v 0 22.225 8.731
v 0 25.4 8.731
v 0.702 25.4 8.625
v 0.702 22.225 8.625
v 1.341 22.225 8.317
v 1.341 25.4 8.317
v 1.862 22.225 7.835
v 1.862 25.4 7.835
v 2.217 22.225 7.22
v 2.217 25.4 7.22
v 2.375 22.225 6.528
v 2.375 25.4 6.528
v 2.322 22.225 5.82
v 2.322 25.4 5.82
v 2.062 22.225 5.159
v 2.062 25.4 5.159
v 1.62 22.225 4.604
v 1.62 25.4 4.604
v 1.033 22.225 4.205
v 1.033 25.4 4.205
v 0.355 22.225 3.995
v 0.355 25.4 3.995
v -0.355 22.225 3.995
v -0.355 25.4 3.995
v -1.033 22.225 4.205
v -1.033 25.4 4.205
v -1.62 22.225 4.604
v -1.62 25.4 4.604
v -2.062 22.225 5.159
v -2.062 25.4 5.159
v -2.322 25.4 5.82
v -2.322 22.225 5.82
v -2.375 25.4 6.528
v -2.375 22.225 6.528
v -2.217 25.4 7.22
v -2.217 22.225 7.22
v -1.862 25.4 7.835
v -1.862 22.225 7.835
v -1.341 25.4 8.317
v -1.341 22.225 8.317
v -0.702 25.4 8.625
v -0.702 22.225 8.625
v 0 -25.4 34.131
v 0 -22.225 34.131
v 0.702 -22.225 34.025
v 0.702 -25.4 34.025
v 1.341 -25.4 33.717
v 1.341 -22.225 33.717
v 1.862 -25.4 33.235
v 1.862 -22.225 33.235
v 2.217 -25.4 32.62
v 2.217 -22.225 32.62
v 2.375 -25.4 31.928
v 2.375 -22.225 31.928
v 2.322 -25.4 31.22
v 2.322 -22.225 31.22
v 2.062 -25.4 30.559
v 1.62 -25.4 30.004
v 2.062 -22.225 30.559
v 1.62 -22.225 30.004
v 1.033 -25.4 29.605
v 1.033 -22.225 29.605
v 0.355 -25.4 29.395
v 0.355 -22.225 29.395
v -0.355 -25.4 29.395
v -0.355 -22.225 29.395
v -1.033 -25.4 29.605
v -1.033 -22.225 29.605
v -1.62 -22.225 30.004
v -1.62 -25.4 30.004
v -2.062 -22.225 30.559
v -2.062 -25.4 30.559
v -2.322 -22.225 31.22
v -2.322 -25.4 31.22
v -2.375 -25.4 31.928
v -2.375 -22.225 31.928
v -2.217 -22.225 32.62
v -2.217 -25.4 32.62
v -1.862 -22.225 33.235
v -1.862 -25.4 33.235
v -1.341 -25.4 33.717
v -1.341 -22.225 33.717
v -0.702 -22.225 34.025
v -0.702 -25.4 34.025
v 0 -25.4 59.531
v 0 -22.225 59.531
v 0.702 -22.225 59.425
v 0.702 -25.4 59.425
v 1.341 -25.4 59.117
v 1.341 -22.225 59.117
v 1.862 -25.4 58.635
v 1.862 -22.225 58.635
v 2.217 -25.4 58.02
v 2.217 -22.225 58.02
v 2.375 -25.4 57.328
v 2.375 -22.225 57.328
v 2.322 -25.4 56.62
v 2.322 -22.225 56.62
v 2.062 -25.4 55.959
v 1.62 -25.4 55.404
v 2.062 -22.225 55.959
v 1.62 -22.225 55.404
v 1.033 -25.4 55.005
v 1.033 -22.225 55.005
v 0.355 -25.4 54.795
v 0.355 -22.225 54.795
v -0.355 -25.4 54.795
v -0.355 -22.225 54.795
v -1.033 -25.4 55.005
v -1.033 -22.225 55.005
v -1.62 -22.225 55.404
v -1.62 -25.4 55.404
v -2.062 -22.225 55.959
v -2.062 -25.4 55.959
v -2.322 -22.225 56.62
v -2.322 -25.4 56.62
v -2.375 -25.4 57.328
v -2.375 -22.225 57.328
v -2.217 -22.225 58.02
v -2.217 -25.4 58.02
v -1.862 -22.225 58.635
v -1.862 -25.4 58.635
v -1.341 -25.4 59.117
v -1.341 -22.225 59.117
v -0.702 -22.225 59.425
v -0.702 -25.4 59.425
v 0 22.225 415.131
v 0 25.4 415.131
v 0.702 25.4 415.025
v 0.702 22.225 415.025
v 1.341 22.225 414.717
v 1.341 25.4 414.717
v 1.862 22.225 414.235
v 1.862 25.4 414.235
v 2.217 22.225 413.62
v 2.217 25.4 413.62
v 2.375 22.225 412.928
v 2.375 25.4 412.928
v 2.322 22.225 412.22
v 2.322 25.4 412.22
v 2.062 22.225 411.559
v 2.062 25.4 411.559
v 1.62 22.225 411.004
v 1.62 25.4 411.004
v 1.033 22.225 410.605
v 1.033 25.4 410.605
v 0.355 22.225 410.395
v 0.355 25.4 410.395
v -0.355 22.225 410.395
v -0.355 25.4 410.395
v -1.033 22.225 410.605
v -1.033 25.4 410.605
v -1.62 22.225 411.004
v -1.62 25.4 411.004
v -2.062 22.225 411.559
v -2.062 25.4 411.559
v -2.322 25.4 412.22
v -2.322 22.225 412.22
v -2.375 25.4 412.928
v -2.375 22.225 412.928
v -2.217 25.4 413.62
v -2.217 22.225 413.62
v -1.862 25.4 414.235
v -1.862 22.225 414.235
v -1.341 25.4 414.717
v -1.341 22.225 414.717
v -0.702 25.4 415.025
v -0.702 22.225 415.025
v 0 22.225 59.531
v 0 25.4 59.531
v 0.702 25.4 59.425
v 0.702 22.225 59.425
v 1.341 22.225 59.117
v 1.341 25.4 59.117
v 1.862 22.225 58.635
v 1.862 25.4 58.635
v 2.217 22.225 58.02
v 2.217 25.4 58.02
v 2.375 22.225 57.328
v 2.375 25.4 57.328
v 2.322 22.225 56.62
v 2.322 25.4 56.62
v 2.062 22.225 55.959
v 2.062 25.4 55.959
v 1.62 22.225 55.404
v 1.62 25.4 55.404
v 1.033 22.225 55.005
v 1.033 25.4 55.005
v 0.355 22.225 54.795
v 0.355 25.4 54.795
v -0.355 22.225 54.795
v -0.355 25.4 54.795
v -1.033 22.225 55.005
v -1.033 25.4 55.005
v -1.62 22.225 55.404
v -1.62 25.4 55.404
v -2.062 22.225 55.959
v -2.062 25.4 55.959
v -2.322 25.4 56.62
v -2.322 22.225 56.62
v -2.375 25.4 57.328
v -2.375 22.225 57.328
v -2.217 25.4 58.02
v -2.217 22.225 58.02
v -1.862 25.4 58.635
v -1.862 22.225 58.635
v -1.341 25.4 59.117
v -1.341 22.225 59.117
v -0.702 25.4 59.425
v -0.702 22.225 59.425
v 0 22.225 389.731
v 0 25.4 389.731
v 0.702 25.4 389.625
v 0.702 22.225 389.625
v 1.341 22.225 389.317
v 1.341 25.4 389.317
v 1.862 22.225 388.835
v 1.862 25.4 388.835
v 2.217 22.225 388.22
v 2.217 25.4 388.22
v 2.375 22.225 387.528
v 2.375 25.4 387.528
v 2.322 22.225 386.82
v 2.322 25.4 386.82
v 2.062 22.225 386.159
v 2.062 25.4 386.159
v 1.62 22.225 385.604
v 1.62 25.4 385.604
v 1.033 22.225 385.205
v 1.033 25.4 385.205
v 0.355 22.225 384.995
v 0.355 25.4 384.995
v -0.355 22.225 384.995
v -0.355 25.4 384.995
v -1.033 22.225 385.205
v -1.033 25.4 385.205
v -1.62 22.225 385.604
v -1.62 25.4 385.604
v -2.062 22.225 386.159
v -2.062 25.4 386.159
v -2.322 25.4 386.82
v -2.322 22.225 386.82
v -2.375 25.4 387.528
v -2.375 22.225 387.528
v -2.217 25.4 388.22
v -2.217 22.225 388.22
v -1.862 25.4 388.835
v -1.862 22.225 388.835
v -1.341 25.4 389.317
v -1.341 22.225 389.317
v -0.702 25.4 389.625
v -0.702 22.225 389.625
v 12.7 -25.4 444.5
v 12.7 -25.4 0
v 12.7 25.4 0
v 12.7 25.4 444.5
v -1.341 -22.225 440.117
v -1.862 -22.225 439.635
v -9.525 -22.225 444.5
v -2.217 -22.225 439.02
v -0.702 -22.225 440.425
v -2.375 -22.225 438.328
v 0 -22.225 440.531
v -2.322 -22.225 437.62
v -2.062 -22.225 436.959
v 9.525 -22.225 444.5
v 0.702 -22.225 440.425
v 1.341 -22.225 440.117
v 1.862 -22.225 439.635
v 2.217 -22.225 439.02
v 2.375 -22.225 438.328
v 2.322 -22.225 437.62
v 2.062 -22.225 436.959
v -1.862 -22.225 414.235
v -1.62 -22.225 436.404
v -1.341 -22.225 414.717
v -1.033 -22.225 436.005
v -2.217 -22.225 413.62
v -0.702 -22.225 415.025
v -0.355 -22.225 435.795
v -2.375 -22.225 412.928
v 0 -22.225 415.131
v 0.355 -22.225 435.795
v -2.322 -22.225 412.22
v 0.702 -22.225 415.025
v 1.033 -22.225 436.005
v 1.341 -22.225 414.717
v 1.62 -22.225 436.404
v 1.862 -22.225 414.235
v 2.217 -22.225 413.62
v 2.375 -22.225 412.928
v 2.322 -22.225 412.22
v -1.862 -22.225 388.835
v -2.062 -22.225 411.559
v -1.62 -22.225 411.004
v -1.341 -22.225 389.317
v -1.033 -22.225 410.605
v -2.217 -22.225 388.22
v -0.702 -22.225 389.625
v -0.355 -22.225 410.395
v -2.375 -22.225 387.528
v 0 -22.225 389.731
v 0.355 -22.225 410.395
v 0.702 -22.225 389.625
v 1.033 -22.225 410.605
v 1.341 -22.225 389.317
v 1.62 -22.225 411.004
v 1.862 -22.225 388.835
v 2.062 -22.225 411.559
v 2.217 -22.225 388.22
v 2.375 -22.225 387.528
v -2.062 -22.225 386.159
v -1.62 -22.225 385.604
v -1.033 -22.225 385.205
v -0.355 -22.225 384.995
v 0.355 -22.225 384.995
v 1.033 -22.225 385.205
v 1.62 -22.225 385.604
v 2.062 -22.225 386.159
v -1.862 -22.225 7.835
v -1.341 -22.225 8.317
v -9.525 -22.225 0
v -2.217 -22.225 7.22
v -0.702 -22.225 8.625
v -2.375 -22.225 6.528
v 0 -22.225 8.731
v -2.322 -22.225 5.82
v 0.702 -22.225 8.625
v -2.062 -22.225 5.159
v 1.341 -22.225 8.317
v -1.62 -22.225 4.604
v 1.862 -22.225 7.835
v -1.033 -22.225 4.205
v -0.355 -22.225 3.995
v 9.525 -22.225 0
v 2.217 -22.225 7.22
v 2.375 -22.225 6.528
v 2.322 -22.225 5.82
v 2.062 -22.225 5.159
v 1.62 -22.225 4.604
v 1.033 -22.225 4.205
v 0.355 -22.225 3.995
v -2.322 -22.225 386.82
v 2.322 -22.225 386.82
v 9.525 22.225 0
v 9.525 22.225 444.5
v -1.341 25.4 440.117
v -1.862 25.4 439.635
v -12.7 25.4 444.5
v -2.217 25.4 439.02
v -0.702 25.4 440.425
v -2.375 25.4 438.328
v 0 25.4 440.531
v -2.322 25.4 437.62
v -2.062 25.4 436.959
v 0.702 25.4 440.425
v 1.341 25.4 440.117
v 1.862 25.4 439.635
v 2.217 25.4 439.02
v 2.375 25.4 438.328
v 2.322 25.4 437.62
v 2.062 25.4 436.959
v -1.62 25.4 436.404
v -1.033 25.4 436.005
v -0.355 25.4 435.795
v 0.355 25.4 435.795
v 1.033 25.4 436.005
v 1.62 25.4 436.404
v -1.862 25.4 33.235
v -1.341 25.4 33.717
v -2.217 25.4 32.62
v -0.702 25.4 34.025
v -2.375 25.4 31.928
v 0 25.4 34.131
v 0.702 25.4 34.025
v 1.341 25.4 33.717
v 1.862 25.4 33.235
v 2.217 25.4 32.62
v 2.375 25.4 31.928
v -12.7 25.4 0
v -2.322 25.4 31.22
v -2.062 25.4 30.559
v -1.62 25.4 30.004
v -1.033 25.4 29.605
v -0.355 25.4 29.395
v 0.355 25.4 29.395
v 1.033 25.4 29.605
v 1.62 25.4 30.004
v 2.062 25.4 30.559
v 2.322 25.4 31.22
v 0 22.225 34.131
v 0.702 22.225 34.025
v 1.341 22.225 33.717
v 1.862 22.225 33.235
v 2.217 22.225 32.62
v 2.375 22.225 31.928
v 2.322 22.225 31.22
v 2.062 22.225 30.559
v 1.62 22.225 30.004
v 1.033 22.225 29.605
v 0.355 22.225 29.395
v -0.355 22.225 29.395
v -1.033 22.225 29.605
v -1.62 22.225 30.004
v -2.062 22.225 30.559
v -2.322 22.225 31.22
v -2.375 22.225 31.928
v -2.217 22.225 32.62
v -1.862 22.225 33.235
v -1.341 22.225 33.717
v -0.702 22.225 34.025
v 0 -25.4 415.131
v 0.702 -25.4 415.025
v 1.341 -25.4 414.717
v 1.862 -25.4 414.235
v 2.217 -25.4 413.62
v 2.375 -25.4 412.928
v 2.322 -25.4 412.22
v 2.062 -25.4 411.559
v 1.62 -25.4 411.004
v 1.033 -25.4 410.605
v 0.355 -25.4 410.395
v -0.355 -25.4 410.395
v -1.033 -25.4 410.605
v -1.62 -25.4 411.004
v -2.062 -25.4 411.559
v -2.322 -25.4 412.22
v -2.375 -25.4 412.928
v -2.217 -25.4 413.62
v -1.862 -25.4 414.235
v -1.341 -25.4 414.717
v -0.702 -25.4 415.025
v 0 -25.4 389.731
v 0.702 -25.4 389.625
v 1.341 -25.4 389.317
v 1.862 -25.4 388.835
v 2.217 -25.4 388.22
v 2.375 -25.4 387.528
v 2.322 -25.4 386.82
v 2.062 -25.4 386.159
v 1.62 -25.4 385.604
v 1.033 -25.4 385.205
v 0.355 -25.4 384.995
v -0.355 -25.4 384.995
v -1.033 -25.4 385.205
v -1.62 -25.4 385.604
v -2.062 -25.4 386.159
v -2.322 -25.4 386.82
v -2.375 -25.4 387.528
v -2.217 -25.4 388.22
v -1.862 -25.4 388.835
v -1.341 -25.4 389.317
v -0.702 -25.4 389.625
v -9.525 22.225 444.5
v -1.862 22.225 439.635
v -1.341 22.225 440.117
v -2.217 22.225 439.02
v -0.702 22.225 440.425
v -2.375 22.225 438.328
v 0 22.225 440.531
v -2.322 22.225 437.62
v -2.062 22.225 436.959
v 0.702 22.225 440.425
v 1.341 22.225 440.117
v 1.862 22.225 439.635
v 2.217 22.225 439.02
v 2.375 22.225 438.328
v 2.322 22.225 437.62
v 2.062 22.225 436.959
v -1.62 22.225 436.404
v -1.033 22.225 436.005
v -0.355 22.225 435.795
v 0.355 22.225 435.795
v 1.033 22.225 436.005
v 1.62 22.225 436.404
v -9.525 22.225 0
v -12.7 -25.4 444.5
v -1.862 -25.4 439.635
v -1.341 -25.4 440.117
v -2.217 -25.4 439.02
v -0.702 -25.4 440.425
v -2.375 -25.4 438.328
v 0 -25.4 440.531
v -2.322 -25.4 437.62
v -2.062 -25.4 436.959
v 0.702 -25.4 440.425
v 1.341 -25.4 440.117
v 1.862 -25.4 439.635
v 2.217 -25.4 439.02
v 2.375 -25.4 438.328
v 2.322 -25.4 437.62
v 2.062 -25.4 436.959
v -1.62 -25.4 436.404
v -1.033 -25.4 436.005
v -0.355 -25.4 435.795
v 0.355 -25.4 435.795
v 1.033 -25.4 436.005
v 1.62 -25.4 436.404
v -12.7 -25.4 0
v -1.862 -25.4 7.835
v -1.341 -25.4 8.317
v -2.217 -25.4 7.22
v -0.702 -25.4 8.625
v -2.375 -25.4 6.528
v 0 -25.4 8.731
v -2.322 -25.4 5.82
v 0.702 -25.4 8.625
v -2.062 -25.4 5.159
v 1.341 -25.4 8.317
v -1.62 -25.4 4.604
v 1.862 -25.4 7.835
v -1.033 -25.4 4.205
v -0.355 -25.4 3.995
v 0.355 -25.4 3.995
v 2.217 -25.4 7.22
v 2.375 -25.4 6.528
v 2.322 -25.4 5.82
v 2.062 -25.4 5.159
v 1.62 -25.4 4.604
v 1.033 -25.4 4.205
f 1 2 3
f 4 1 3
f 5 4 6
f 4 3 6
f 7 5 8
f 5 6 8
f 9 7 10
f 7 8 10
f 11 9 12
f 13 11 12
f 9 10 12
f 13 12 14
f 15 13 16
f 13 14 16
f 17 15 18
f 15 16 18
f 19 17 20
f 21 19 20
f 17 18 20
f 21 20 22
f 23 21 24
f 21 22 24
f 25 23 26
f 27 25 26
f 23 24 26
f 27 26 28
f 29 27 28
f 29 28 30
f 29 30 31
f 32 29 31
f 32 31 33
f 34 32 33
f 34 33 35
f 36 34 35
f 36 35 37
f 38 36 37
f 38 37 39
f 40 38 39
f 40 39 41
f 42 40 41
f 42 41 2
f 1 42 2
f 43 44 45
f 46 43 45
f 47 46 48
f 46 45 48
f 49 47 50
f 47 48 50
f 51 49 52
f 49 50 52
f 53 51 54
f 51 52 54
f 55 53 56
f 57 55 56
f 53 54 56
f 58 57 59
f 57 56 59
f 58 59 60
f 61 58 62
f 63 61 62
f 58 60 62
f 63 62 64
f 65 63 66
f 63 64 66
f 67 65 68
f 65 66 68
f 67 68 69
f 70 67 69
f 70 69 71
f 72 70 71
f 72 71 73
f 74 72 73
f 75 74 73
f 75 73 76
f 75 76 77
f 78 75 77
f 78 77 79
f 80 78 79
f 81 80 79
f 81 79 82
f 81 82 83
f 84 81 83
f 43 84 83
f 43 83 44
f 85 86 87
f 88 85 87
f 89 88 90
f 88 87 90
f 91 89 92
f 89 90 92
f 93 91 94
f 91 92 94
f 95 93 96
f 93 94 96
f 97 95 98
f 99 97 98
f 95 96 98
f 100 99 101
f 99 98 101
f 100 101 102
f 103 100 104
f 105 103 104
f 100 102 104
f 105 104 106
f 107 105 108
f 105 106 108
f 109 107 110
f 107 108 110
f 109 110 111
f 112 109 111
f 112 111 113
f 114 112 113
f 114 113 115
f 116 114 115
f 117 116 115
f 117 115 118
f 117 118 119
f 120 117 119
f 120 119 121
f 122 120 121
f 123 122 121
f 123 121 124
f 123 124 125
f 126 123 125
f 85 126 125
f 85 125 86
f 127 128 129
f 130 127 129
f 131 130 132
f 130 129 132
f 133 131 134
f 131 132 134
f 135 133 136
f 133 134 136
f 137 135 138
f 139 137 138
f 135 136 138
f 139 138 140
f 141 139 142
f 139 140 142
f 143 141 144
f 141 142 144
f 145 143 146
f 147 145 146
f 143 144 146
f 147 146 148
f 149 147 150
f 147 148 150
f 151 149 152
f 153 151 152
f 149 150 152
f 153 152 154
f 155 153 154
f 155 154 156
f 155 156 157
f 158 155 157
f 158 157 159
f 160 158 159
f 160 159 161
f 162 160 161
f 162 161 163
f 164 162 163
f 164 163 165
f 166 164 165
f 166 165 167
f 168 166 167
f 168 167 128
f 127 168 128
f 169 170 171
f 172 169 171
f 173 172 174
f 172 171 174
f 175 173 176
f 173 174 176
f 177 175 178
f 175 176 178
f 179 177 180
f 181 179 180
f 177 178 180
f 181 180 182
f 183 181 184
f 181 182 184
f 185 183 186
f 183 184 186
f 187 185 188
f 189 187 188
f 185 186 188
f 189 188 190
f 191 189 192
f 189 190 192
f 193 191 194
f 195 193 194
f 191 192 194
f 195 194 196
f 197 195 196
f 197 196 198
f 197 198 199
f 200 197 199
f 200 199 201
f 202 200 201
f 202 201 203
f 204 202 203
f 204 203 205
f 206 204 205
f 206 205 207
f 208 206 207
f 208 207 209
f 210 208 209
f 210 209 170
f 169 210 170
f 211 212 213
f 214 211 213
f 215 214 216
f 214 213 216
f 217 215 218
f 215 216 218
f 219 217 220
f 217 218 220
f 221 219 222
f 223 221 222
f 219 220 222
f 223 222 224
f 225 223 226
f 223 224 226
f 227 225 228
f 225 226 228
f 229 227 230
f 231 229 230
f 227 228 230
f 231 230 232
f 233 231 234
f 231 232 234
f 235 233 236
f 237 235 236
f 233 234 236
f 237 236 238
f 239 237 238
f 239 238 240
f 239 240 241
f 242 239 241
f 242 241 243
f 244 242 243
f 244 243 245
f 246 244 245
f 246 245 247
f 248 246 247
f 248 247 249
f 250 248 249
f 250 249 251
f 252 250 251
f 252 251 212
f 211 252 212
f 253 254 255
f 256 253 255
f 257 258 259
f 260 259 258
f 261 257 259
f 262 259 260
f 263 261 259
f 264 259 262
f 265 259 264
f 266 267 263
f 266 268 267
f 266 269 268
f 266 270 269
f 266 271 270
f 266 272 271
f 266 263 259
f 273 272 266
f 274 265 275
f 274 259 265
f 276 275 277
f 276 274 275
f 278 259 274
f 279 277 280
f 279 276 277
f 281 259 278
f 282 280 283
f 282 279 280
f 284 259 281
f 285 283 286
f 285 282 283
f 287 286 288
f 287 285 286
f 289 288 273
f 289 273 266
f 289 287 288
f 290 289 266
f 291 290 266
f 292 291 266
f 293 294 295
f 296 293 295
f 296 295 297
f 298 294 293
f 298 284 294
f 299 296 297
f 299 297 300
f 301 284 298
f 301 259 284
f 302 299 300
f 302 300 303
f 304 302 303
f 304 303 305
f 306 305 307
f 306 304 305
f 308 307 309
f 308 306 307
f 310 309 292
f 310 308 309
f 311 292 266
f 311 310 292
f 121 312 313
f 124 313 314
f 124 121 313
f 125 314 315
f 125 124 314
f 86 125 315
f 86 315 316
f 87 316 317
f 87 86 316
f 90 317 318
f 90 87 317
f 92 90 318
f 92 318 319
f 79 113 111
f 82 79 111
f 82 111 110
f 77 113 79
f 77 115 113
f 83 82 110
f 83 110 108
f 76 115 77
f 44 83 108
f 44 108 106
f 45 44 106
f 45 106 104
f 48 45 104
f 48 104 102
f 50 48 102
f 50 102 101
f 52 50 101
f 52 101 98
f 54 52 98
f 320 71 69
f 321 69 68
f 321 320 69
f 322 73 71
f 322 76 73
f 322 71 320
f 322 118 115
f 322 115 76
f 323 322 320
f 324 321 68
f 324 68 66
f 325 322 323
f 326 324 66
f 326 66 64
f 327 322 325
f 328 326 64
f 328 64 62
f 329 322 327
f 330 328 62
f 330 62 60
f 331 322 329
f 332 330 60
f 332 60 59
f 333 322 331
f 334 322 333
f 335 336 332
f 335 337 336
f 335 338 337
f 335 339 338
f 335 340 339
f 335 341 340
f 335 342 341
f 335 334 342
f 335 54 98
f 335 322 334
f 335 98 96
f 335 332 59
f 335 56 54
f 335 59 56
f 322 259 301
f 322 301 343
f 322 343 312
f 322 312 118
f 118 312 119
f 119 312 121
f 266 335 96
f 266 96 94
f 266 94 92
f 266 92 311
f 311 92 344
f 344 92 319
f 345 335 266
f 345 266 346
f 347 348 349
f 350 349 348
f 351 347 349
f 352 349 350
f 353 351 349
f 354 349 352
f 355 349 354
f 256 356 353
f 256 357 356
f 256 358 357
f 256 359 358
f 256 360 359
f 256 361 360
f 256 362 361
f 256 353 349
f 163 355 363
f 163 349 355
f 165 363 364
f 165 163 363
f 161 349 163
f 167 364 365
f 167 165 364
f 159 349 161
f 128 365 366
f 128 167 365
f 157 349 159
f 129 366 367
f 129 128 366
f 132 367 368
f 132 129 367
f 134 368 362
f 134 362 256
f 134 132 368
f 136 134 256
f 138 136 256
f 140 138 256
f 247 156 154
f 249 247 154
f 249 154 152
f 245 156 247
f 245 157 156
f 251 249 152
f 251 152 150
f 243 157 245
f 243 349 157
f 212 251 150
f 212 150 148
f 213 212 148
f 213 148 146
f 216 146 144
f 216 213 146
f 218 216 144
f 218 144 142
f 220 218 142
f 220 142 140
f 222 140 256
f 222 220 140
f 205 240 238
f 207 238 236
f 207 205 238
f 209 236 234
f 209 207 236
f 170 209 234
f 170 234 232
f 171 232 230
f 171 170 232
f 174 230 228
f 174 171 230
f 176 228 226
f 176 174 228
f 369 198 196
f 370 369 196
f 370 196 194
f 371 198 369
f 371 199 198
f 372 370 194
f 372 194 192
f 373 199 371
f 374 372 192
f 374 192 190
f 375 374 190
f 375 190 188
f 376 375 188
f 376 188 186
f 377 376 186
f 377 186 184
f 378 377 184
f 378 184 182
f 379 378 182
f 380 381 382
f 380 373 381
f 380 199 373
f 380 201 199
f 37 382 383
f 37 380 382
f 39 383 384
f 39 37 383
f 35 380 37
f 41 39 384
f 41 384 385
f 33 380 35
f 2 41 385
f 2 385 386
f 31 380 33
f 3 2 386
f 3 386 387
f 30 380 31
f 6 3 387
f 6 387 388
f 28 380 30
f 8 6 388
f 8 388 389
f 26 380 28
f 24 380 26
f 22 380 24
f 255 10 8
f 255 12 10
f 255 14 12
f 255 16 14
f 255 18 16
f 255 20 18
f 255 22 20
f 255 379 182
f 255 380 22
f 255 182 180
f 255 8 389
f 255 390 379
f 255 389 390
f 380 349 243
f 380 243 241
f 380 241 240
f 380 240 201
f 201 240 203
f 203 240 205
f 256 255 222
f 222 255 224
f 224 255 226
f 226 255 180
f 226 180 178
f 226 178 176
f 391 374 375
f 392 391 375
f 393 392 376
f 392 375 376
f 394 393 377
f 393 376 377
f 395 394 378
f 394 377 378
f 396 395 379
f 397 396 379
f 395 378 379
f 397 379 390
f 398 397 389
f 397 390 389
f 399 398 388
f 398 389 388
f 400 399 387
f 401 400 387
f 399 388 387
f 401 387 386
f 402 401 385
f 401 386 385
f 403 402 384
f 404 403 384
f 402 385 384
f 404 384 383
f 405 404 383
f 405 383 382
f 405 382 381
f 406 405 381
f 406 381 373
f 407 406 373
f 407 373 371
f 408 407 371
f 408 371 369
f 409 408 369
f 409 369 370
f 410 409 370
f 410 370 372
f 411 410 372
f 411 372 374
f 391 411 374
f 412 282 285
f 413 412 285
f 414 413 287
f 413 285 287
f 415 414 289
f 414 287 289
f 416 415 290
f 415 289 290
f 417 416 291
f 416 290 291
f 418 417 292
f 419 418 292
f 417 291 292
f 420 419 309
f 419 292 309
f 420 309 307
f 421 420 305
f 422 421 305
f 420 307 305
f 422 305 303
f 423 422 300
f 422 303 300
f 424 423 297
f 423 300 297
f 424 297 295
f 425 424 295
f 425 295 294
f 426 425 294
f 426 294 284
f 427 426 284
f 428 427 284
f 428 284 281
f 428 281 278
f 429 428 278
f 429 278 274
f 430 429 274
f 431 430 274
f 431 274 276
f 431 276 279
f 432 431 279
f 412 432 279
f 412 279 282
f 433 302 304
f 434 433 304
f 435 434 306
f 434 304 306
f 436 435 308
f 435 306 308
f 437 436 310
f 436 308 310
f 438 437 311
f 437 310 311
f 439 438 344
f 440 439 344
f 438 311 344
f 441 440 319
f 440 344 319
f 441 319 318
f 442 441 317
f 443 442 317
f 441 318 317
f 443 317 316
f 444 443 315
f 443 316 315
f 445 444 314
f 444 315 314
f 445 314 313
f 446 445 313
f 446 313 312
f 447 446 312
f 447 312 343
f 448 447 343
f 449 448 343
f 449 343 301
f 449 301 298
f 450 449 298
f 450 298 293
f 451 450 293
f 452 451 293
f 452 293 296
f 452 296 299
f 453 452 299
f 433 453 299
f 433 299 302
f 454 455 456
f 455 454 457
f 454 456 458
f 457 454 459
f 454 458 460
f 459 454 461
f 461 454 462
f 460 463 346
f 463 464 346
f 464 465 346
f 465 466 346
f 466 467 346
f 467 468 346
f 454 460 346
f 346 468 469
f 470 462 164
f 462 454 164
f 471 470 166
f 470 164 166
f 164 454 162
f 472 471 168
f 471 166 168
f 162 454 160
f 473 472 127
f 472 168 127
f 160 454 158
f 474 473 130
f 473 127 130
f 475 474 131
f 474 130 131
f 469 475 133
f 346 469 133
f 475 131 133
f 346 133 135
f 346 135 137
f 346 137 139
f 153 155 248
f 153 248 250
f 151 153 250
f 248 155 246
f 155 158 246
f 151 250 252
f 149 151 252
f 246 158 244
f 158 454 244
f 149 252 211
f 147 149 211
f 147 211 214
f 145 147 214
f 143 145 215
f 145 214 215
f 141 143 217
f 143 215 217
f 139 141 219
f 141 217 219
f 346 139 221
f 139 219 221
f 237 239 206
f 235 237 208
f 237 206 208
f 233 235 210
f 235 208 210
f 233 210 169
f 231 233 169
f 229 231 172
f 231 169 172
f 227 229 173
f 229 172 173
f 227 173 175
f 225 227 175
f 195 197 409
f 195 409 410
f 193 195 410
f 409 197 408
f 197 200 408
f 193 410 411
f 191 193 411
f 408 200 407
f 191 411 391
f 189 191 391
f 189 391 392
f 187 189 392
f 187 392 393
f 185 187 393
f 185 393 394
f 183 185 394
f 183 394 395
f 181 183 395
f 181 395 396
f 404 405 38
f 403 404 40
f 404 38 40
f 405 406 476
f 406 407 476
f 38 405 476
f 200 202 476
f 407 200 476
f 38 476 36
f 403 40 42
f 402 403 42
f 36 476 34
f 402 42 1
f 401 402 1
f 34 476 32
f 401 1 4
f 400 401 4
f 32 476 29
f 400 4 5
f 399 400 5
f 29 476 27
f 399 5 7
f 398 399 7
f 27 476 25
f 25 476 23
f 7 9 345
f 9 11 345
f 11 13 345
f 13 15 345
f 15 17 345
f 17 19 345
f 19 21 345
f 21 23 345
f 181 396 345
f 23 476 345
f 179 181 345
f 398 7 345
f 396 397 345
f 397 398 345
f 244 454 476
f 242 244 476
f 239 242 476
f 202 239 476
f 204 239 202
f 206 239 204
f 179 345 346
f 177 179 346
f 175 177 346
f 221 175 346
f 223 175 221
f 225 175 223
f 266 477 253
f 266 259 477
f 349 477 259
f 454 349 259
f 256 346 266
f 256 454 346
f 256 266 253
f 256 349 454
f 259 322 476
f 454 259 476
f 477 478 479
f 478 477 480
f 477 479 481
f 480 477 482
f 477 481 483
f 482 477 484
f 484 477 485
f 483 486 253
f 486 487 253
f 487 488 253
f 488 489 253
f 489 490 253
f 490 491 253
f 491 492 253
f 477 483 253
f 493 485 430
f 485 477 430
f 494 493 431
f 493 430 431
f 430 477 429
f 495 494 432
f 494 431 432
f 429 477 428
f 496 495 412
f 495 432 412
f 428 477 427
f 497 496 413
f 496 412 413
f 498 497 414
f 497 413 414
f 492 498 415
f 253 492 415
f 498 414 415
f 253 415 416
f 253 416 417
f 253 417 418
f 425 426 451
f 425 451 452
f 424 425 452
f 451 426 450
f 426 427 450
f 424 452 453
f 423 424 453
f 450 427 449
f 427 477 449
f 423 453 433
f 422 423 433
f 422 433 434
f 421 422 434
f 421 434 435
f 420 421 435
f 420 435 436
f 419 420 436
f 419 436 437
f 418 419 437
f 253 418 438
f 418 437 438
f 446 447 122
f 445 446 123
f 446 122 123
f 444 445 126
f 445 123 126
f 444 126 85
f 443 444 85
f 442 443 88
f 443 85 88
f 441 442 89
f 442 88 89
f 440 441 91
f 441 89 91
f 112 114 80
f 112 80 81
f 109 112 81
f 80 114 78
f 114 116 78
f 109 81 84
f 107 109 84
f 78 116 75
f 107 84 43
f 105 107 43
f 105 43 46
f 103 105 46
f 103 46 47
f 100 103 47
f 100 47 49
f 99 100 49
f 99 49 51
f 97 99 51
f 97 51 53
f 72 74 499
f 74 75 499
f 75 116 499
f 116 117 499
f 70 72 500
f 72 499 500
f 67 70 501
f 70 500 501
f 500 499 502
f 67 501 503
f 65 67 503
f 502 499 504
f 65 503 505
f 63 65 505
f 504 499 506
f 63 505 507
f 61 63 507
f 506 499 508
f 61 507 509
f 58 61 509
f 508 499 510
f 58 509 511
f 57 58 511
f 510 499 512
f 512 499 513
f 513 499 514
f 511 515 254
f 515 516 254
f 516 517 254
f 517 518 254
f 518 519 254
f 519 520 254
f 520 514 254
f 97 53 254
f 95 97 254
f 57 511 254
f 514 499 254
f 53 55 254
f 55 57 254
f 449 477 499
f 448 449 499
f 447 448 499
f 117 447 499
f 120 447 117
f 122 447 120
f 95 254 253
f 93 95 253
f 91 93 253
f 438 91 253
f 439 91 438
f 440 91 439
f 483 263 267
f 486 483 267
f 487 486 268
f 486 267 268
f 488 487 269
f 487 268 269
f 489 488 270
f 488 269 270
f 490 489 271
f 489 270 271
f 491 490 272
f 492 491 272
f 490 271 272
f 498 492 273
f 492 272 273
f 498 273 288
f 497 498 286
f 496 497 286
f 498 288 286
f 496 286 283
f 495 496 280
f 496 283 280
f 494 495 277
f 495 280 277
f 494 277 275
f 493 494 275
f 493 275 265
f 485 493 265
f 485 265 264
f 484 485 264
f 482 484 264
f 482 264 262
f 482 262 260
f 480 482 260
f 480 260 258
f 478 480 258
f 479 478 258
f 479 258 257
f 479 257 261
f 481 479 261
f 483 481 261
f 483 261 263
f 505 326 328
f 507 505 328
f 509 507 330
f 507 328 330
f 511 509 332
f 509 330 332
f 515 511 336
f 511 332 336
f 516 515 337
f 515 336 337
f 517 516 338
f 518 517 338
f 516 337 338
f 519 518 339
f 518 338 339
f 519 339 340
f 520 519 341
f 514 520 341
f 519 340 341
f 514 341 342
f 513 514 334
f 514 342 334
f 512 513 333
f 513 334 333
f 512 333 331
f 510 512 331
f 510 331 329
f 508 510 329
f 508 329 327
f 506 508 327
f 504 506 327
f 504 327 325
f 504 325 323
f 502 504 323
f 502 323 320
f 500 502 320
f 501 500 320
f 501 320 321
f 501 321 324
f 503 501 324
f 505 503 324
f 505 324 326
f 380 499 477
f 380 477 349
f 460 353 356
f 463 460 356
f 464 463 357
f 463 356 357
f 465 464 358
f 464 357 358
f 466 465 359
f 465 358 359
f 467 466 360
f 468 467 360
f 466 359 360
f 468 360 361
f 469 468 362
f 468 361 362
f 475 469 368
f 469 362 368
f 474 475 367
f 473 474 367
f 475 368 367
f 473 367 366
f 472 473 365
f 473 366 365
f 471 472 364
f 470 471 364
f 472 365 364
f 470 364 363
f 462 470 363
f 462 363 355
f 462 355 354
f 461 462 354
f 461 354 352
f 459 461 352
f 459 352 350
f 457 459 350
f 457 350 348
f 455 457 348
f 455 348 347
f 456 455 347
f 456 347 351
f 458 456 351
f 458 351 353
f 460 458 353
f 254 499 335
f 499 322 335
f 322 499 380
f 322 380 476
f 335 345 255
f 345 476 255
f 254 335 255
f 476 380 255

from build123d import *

# Parameters (mm, degrees)
SKETCH1_W           = 25.4
SKETCH1_H           = 50.8
BOSS_EXTRUDE1_DEPTH = 444.5
SHELL1_T            = -3.175
SKETCH2_R           = 2.38125
CUT_EXTRUDE1_DEPTH  = 448.573658742


with BuildPart() as part:
    # Sketch1 → Boss-Extrude1 (new body)
    with BuildSketch(Plane.XY):
        Rectangle(SKETCH1_W, SKETCH1_H)
    extrude(amount=BOSS_EXTRUDE1_DEPTH)

    # Shell1
    shell1_openings = [part.faces().sort_by_distance(p)[0] for p in [
        (0, 0, 444.5),
        (0, 0, 0),
    ]]
    offset(amount=SHELL1_T, openings=shell1_openings, kind=Kind.INTERSECTION)

    # Sketch2 → Cut-Extrude1 (cut, through all)
    with BuildSketch(Plane(origin=(0, 25.4, 0), x_dir=(1, 0, 0), z_dir=(0, 1, 0))):
        with Locations(Location((0, -6.35, 0), (0, 0, 270))):
            Circle(SKETCH2_R)
        with Locations(Location((0, -31.75, 0), (0, 0, 270))):
            Circle(SKETCH2_R)
        with Locations(Location((0, -57.15, 0), (0, 0, 270))):
            Circle(SKETCH2_R)
        with Locations(Location((0, -387.35, 0), (0, 0, 270))):
            Circle(SKETCH2_R)
        with Locations(Location((0, -412.75, 0), (0, 0, 270))):
            Circle(SKETCH2_R)
        with Locations(Location((0, -438.15, 0), (0, 0, 270))):
            Circle(SKETCH2_R)
    extrude(amount=-CUT_EXTRUDE1_DEPTH, mode=Mode.SUBTRACT)


solid = part.part
